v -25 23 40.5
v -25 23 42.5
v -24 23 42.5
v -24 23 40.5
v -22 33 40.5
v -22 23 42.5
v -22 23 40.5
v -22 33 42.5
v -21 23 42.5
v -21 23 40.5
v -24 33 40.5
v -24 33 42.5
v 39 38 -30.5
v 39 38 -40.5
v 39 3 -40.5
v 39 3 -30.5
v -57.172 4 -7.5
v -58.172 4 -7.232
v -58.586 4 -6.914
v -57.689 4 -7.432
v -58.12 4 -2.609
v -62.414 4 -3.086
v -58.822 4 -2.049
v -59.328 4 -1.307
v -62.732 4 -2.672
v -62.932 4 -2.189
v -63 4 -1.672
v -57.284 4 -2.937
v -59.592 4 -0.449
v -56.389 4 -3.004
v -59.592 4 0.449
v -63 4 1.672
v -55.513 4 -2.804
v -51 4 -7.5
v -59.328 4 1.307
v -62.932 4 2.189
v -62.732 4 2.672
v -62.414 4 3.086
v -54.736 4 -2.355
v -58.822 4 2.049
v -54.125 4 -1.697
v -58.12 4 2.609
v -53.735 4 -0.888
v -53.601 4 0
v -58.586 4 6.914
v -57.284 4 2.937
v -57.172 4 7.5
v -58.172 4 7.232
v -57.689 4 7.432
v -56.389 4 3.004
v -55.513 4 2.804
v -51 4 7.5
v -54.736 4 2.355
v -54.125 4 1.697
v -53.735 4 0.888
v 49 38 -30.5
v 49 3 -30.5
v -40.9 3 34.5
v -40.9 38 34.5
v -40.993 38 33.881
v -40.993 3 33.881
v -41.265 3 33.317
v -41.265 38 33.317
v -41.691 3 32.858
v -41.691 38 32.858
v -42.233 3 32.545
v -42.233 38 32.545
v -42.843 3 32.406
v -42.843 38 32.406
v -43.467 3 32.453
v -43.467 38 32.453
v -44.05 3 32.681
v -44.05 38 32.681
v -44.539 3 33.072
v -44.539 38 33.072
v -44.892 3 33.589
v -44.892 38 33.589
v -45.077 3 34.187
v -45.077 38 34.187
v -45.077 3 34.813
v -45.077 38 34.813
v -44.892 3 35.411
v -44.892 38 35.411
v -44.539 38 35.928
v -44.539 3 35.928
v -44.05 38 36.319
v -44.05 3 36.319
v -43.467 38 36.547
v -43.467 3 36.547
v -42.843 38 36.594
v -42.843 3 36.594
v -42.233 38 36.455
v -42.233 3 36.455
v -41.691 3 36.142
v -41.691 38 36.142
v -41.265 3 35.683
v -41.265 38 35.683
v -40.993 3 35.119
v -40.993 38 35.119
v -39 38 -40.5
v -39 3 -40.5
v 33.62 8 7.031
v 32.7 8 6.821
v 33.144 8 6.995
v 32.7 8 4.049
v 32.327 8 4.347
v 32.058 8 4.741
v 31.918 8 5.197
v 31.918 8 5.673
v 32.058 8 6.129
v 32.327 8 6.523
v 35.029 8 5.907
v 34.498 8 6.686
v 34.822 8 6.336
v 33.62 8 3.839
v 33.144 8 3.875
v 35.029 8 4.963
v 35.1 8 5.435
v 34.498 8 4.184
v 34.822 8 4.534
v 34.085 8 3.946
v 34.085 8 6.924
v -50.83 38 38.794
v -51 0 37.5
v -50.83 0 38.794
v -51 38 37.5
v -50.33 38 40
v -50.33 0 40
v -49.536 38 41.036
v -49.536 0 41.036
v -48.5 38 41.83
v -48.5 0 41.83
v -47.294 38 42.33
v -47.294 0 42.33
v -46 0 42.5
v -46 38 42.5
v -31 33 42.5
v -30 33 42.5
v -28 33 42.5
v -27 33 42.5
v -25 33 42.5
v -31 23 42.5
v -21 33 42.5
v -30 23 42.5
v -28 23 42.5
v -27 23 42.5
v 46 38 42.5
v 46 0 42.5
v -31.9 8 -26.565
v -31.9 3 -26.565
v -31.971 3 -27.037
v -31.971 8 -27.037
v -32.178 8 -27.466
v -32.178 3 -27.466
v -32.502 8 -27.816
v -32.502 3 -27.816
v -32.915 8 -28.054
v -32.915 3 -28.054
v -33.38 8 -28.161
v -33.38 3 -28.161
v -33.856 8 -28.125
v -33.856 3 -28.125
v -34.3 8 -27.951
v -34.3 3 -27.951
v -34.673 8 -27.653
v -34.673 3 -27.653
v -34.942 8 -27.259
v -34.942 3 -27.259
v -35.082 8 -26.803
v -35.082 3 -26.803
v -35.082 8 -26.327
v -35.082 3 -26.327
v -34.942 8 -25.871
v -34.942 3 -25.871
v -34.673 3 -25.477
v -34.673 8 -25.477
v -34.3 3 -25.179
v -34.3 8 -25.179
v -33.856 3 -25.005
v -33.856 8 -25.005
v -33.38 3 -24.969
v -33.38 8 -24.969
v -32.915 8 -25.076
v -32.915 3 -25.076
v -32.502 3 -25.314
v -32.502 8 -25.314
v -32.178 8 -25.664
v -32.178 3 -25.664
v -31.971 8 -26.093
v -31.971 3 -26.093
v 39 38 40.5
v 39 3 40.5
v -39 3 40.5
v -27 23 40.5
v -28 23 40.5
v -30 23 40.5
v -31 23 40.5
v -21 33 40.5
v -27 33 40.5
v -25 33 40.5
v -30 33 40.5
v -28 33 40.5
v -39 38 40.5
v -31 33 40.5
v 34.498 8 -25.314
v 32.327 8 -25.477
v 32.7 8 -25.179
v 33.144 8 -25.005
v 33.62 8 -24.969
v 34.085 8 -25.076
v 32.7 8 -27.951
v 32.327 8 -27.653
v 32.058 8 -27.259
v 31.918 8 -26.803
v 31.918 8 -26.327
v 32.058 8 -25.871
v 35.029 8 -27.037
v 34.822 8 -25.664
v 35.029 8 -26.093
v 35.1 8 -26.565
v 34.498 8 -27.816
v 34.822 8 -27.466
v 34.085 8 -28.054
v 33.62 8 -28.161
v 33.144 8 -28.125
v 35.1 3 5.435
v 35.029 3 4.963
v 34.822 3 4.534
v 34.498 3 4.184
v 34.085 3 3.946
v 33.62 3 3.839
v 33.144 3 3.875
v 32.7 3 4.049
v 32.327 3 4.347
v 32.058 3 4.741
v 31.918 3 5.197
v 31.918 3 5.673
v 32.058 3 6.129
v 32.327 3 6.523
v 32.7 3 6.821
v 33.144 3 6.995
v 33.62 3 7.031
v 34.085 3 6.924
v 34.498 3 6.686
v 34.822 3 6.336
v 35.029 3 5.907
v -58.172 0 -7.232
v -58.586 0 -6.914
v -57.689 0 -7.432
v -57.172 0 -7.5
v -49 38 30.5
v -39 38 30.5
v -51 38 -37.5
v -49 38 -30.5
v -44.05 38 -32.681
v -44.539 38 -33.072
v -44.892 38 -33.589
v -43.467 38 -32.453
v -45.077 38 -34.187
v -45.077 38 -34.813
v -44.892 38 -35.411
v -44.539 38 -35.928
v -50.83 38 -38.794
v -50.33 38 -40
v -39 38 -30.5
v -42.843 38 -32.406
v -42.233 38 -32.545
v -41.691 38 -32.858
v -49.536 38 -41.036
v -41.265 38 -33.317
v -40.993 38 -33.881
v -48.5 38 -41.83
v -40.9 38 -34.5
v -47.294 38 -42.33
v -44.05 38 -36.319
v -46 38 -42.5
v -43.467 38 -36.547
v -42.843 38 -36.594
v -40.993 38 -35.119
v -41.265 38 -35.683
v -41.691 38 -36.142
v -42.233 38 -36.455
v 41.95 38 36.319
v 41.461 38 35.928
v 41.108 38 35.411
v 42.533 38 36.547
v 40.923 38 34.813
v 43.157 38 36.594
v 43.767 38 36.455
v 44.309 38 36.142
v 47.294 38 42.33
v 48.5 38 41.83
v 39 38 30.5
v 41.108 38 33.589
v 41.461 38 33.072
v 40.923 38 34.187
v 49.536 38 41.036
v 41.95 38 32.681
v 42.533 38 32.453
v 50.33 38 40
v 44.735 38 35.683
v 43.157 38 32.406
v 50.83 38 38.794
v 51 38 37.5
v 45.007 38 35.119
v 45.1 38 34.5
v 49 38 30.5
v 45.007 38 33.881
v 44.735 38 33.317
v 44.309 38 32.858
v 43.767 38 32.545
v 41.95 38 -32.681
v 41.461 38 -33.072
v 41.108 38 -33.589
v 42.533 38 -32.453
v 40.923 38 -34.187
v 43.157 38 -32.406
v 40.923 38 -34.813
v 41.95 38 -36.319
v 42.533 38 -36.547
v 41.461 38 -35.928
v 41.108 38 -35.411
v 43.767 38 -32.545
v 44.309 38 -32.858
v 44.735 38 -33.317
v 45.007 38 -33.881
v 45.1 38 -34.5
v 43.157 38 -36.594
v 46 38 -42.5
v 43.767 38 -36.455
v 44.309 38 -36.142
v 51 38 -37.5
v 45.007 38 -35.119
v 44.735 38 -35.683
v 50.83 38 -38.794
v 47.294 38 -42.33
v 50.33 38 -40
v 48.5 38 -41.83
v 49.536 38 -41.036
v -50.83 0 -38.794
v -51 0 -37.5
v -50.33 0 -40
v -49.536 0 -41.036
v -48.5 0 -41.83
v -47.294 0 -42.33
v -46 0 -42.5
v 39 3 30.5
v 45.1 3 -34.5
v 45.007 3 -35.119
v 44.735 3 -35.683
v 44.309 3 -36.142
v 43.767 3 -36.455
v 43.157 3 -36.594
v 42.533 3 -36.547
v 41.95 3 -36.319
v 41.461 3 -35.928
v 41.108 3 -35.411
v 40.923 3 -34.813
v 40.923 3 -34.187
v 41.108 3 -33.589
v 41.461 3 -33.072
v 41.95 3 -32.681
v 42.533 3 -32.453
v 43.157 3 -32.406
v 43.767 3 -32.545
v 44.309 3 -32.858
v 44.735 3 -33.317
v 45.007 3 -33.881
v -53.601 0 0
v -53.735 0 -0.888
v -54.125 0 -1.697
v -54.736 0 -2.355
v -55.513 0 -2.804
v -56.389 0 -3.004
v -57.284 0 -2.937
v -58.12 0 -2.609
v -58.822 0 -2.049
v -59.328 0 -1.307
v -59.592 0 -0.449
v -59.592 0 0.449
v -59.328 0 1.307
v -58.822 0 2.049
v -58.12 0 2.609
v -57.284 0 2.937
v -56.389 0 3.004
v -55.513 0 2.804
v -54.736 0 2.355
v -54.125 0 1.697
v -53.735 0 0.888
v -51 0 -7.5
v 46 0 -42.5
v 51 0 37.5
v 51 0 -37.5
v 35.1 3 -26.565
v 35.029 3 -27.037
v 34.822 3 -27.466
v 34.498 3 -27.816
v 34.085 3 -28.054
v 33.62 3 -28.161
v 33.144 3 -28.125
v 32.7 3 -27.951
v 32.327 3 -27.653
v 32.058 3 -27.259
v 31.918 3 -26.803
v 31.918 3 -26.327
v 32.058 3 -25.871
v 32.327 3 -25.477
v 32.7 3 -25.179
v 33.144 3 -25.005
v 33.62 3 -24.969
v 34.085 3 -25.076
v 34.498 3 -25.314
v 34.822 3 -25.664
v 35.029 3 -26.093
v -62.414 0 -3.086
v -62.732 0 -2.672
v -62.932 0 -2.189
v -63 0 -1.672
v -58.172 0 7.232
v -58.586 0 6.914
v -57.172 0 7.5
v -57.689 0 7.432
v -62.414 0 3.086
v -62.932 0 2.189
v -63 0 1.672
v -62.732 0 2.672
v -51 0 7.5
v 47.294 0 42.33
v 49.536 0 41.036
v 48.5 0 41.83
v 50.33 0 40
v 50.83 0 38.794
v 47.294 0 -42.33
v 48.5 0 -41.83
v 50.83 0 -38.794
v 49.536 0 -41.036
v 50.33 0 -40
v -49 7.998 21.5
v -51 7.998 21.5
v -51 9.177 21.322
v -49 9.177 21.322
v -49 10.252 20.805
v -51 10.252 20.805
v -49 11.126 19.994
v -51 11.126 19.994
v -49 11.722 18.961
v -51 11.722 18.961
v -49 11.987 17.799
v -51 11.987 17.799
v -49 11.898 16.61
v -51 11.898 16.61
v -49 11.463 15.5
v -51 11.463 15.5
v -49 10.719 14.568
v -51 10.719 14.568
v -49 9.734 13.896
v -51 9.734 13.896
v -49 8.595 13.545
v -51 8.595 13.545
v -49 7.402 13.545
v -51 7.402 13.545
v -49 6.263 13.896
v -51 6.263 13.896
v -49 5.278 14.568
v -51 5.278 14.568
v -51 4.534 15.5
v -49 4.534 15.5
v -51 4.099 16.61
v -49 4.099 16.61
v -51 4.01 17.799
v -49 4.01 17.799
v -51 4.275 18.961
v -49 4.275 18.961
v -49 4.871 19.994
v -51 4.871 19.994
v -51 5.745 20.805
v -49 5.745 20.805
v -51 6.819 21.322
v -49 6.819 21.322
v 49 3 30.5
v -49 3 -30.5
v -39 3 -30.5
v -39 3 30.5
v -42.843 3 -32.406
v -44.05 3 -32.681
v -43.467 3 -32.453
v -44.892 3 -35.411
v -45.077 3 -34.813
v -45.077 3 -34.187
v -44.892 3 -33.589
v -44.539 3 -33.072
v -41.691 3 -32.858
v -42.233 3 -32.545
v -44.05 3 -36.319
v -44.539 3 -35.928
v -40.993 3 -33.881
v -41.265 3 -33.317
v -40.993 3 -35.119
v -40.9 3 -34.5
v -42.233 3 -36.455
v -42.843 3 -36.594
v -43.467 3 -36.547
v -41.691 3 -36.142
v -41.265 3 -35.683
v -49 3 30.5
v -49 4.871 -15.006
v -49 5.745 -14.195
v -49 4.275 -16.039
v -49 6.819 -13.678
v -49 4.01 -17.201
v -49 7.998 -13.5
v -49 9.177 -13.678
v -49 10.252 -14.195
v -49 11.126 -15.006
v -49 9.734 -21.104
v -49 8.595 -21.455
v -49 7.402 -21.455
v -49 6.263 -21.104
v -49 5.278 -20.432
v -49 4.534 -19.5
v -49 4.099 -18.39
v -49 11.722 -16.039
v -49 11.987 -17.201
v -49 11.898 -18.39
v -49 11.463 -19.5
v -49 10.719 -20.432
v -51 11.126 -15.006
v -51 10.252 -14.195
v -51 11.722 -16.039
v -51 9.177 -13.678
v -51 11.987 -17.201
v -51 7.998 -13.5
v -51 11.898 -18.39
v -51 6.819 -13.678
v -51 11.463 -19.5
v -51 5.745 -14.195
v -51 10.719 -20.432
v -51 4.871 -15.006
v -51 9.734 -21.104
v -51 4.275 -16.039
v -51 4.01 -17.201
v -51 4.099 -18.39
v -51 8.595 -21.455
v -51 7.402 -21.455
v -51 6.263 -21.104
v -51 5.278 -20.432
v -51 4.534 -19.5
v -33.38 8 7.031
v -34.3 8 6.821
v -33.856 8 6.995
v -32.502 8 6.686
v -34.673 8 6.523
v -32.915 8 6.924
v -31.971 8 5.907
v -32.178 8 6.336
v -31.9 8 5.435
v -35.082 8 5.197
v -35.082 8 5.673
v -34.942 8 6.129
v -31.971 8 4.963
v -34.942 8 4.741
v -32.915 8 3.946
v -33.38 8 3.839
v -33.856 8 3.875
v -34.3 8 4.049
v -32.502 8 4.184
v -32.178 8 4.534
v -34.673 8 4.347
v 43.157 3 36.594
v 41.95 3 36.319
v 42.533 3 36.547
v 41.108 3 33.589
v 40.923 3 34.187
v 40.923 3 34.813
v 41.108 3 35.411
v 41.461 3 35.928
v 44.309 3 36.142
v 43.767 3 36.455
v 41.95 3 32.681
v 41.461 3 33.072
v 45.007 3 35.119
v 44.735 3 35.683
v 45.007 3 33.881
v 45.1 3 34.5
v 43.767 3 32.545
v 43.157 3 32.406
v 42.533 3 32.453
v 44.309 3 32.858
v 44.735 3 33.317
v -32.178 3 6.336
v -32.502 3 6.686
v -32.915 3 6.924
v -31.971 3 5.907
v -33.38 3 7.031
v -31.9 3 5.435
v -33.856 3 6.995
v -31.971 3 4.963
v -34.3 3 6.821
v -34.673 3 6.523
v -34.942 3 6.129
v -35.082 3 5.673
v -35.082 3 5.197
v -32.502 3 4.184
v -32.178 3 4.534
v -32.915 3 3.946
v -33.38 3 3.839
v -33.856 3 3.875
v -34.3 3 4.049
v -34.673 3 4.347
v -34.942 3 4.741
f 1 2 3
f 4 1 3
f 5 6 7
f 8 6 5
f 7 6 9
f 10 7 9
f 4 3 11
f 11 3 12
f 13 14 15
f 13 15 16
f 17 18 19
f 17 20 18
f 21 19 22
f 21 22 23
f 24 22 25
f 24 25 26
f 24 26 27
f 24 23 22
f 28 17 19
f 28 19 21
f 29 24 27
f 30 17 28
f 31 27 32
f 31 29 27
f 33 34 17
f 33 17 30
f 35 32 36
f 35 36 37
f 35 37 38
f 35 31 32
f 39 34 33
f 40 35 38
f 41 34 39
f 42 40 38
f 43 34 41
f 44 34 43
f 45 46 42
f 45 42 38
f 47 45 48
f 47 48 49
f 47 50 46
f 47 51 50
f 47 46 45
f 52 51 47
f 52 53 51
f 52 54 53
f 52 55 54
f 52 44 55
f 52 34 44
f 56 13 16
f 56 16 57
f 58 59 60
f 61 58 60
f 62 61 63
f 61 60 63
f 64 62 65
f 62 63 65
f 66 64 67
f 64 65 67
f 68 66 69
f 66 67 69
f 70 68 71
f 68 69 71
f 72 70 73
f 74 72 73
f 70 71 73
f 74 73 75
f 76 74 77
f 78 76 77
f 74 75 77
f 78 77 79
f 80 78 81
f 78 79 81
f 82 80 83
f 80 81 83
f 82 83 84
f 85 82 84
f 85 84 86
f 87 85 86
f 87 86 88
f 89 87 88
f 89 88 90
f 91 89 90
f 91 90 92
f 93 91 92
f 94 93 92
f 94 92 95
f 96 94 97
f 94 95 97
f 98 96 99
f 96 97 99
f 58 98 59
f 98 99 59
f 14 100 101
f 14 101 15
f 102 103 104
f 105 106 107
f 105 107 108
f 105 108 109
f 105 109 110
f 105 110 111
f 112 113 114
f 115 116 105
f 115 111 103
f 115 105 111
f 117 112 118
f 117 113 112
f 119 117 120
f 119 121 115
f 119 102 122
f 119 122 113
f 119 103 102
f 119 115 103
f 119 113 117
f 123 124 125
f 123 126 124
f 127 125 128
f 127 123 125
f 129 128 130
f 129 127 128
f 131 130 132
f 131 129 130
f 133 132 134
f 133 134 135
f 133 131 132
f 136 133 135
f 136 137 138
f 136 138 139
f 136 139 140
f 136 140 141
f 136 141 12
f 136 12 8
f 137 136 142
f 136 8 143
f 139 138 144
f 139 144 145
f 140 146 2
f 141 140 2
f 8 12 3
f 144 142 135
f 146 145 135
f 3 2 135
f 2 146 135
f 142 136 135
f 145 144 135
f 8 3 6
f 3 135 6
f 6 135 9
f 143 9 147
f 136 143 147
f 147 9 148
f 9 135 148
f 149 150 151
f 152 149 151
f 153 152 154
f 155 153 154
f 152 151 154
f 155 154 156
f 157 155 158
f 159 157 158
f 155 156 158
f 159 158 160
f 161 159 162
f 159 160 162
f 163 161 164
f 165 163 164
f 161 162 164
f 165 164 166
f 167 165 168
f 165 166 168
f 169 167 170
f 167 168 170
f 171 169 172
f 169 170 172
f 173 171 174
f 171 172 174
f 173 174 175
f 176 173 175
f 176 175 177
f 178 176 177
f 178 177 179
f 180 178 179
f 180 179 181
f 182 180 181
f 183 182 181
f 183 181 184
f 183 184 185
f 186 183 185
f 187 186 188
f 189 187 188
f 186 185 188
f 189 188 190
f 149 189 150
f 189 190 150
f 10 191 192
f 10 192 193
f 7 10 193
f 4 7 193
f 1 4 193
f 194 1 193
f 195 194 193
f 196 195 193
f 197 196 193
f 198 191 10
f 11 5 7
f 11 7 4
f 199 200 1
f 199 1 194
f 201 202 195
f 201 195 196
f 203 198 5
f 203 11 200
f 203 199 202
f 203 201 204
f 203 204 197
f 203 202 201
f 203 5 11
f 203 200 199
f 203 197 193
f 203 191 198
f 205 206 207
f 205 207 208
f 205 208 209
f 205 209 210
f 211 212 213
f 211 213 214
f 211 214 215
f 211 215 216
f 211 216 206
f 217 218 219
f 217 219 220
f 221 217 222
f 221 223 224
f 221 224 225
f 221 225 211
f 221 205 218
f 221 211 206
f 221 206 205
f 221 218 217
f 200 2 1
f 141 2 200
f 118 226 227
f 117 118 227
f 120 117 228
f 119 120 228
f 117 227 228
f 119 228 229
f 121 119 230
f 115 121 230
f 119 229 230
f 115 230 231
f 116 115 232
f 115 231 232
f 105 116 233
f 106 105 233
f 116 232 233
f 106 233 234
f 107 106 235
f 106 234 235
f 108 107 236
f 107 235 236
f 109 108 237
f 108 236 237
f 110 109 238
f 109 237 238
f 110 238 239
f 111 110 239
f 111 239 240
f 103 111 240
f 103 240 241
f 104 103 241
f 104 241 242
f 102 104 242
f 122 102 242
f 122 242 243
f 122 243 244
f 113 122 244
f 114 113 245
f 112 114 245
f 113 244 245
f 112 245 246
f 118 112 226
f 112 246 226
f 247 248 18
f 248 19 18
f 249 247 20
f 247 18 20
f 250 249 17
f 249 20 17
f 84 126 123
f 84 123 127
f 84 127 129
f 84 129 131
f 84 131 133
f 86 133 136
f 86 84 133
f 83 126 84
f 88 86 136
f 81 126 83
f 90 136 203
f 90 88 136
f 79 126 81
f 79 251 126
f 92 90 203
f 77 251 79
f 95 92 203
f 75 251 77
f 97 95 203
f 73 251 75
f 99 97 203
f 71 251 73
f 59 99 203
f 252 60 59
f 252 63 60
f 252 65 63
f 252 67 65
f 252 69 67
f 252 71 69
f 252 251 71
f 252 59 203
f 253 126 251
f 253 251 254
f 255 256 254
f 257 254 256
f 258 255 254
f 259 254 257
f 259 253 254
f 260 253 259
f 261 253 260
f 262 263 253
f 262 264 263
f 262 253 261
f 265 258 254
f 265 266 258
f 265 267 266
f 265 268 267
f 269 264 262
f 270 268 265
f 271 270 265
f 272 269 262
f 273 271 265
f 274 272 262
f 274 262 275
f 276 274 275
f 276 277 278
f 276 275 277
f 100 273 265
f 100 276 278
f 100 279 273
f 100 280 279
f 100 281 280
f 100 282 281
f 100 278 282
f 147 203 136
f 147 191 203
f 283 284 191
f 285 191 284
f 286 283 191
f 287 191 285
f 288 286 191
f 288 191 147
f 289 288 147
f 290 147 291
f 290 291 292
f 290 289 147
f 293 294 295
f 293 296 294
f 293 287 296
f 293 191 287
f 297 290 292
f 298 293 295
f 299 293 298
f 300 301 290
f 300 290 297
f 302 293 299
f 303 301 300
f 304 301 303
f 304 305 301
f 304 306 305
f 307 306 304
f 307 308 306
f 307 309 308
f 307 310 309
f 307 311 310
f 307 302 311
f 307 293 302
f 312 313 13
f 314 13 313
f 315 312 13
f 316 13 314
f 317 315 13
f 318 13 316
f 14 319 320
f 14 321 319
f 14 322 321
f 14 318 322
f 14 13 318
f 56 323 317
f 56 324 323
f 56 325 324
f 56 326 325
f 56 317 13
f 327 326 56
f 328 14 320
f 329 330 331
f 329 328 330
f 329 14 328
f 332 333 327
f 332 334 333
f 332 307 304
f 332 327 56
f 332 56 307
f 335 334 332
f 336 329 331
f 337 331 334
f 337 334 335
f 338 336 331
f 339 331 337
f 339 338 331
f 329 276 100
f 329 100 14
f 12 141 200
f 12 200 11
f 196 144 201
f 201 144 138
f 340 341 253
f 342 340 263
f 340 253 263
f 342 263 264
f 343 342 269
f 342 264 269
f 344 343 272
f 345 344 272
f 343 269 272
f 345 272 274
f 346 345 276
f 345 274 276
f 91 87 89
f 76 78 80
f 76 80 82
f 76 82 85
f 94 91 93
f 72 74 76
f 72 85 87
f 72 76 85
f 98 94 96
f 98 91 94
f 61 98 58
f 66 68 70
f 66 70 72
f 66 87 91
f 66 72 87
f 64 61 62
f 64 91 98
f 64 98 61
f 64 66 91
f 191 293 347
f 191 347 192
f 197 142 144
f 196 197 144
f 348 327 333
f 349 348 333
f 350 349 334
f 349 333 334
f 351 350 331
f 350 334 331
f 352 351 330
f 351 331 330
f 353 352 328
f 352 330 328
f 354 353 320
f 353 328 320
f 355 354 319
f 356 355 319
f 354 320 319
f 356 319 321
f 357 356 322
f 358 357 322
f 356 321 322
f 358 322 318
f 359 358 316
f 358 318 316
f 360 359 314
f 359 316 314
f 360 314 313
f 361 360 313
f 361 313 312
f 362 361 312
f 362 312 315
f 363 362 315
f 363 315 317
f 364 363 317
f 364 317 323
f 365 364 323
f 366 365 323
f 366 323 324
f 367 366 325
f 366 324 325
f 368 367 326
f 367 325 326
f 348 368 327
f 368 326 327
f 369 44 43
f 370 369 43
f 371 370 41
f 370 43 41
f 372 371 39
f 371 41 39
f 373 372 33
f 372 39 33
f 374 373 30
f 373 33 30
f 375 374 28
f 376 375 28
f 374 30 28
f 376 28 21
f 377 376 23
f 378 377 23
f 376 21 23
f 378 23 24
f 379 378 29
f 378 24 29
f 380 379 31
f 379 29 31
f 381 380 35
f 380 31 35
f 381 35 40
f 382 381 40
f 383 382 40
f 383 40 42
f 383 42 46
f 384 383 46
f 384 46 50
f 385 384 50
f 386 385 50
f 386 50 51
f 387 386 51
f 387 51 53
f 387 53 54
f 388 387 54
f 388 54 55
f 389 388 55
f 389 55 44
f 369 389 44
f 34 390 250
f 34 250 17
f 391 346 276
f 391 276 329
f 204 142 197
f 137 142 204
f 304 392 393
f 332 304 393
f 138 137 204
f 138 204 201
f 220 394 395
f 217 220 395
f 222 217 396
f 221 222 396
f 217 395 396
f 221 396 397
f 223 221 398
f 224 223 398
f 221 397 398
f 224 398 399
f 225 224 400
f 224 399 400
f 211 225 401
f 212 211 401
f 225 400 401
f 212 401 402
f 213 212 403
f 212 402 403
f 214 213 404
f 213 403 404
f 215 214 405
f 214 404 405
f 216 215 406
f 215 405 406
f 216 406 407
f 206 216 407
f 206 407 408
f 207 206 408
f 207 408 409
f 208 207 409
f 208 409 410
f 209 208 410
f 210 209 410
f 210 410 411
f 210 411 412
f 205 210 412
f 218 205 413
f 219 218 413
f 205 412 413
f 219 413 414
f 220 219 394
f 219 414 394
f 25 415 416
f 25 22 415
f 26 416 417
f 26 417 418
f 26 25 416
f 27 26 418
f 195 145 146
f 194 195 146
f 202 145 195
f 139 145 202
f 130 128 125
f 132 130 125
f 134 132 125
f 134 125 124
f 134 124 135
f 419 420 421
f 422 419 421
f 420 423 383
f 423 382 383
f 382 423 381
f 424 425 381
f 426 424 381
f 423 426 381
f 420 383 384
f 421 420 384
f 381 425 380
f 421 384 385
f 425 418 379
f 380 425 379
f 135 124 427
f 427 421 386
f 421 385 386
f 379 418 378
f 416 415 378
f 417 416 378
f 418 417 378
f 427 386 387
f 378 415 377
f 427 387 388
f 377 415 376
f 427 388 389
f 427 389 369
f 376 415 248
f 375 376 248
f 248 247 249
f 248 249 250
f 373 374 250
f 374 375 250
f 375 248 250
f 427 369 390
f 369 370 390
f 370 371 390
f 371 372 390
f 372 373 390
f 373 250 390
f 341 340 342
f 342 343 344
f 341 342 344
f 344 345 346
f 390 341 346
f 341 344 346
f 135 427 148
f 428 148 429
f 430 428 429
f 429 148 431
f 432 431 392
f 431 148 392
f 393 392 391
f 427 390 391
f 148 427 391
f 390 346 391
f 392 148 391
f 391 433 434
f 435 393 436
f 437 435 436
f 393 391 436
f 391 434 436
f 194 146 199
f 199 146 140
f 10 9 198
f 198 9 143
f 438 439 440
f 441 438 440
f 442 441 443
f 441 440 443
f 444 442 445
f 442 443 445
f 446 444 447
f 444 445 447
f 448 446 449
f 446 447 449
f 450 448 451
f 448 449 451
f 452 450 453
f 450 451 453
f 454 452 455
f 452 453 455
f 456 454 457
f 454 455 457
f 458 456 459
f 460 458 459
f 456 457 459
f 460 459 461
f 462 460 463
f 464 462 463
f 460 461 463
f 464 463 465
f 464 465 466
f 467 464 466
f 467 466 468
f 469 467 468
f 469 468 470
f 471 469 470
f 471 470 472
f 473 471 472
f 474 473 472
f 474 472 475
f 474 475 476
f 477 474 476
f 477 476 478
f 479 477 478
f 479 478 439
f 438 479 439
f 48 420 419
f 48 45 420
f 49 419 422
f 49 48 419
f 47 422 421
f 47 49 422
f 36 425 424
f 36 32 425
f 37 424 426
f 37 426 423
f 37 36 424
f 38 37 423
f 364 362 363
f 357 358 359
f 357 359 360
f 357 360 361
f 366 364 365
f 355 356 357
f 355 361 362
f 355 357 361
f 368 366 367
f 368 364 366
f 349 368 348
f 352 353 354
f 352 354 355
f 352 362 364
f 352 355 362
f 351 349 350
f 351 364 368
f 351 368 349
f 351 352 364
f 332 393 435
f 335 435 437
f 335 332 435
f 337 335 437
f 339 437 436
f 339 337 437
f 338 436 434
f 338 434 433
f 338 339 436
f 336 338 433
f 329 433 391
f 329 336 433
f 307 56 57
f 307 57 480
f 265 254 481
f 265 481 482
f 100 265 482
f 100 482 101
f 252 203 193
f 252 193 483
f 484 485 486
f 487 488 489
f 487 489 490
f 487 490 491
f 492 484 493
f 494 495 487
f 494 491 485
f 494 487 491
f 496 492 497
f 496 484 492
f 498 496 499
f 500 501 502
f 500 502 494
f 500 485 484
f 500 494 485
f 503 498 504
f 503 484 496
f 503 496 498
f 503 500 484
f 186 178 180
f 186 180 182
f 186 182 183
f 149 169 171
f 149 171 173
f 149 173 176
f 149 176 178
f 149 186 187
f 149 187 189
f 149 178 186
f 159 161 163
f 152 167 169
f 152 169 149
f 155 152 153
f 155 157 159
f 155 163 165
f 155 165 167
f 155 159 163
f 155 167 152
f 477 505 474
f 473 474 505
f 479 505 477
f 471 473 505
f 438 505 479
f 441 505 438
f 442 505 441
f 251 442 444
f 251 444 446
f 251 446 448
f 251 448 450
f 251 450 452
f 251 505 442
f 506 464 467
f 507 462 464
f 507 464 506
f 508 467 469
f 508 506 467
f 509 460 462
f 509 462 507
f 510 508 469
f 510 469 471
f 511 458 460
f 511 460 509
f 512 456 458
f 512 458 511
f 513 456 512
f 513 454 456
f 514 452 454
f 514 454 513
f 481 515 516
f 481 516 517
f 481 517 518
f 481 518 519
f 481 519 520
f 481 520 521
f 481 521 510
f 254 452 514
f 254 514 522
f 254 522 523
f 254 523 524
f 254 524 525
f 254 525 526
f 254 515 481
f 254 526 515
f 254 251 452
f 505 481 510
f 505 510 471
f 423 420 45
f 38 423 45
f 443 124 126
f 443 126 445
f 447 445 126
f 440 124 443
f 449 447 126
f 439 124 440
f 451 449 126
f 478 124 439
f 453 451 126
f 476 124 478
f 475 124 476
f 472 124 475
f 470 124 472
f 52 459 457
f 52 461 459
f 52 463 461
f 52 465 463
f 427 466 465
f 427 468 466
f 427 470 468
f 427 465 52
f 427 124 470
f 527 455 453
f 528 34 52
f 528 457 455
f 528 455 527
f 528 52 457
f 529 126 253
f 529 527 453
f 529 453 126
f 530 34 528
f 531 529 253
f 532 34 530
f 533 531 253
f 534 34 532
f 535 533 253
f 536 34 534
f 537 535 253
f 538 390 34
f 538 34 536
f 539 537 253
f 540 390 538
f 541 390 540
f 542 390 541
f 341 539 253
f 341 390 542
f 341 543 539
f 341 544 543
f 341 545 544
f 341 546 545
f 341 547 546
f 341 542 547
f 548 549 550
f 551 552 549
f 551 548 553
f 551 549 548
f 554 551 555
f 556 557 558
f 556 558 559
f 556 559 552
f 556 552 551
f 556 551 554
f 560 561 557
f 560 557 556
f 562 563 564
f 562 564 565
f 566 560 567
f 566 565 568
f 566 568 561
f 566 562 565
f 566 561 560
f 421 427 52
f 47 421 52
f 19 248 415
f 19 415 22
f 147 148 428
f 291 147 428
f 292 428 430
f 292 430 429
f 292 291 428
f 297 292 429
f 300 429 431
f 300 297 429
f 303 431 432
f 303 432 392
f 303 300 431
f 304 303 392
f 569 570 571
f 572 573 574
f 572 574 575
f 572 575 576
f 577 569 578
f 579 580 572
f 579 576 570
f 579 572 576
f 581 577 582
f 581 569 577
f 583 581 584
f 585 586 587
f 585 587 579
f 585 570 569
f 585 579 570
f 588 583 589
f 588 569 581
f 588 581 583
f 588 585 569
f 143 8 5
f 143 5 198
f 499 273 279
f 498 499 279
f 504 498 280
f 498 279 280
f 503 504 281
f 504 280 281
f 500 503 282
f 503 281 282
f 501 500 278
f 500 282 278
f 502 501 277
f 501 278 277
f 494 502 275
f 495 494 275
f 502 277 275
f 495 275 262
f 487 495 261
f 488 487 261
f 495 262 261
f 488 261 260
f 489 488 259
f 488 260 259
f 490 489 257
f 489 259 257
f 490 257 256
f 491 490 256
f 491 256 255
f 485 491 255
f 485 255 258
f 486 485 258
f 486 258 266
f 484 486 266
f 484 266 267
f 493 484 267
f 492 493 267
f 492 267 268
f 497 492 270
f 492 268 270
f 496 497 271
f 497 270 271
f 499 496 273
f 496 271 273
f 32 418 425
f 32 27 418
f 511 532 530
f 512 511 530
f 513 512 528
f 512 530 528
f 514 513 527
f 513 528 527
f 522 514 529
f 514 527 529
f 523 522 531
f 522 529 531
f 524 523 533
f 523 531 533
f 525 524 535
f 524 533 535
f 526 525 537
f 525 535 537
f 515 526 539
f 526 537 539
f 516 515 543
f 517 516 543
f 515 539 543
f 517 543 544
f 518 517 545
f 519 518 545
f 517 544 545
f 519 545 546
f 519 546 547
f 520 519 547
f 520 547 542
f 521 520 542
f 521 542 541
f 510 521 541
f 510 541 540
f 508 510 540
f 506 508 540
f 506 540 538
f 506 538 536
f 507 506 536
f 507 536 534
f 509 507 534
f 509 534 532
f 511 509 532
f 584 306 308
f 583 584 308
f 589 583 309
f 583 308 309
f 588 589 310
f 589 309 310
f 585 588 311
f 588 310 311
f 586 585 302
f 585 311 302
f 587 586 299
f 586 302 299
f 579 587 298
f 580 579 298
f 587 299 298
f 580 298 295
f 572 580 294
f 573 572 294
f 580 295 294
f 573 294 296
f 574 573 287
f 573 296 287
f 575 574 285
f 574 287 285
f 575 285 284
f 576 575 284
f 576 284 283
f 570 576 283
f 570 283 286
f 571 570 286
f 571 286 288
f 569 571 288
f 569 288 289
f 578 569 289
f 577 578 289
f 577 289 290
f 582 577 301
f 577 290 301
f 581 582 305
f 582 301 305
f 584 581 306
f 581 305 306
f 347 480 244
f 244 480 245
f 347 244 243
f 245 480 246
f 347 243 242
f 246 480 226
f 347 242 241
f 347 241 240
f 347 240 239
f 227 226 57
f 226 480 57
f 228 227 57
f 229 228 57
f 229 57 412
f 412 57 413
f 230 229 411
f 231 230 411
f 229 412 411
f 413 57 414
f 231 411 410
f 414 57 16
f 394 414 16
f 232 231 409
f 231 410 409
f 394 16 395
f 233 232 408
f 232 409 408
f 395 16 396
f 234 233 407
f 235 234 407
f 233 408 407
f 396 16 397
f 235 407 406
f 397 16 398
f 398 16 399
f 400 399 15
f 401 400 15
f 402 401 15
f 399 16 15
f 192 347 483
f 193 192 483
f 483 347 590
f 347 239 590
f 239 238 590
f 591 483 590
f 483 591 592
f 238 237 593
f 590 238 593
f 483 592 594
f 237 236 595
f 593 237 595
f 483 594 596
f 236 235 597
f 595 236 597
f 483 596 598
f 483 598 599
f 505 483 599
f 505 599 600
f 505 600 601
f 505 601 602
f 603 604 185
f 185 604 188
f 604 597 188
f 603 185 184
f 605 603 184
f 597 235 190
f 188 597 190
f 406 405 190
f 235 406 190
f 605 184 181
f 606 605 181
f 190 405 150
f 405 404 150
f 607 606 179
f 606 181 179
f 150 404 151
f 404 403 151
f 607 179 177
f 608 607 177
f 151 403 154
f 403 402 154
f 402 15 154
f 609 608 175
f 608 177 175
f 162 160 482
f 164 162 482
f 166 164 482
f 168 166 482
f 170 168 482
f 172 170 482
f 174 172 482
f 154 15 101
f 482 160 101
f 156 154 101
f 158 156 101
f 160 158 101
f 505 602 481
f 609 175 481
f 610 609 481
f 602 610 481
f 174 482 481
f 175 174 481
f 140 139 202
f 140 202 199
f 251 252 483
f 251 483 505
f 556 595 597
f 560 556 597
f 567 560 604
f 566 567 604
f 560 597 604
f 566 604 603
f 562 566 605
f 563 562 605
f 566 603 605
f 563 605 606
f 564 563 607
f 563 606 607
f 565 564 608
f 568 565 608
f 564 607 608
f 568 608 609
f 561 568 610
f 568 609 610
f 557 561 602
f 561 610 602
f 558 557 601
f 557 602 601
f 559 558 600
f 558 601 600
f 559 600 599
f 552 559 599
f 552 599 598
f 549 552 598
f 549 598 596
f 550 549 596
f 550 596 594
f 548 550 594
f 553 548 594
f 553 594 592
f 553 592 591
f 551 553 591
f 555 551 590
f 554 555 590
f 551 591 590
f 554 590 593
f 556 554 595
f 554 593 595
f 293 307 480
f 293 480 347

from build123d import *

# Parameters (mm, degrees)
SKETCH1_W           = 102
SKETCH1_H           = 85
BOSS_EXTRUDE1_DEPTH = 38
SKETCH2_R           = 2.1
CUT_EXTRUDE1_DEPTH  = 35
SKETCH3_R           = 2.1
CUT_EXTRUDE2_DEPTH  = 35
SKETCH5_R           = 4
CUT_EXTRUDE4_DEPTH  = 10
FILLET1_R           = 5
FILLET2_R           = 5
FILLET3_R           = 5
FILLET4_R           = 5
SKETCH6_R           = 1.6
BOSS_EXTRUDE2_DEPTH = 5
SKETCH7_W           = 15
SKETCH7_H           = 4
BOSS_EXTRUDE3_DEPTH = 12
CHAMFER1_SIZE       = 5
CHAMFER2_SIZE       = 5
SKETCH8_R           = 3.012300636
CUT_EXTRUDE5_DEPTH  = 5
FILLET5_R           = 2
FILLET6_R           = 2
FILLET7_R           = 2
FILLET8_R           = 2
SKETCH9_W           = 1
SKETCH9_H           = 10
CUT_EXTRUDE6_DEPTH  = 2.1
SKETCH10_W          = 1
SKETCH10_H          = 10
CUT_EXTRUDE7_DEPTH  = 2.1


with BuildPart() as part:
    # Sketch1 → Boss-Extrude1 (new body)
    with BuildSketch(Plane(origin=(0, 0, 0), x_dir=(1, 0, 0), z_dir=(0, 1, 0))):
        Rectangle(SKETCH1_W, SKETCH1_H)
    extrude(amount=BOSS_EXTRUDE1_DEPTH)

    # Sketch2 → Cut-Extrude1 (cut)
    with BuildSketch(Plane(origin=(0, 38, 0), x_dir=(1, 0, 0), z_dir=(0, 1, 0))):
        with Locations((43, 34.5)):
            Circle(SKETCH2_R)
        with Locations((-43, -34.5)):
            Circle(SKETCH2_R)
        with Locations((43, -34.5)):
            Circle(SKETCH2_R)
        Polygon((-39, 40.5), (39, 40.5), (39, 30.5), (49, 30.5), (49, -30.5), (39, -30.5), (39, -40.5), (-39, -40.5), (-39, -30.5), (-49, -30.5), (-49, 30.5), (-39, 30.5), align=None)
    extrude(amount=-CUT_EXTRUDE1_DEPTH, mode=Mode.SUBTRACT)

    # Sketch3 → Cut-Extrude2 (cut)
    with BuildSketch(Plane(origin=(0, 38, 0), x_dir=(1, 0, 0), z_dir=(0, 1, 0))):
        with Locations((-43, 34.5)):
            Circle(SKETCH3_R)
    extrude(amount=-CUT_EXTRUDE2_DEPTH, mode=Mode.SUBTRACT)

    # Sketch5 → Cut-Extrude4 (cut)
    with BuildSketch(Plane.ZY.offset(51)):
        with Locations((-17.5, 7.998461061)):
            Circle(SKETCH5_R)
        with Locations((17.5, 7.998461061)):
            Circle(SKETCH5_R)
    extrude(amount=-CUT_EXTRUDE4_DEPTH, mode=Mode.SUBTRACT)

    # Fillet1
    fillet1_edges = [part.edges().sort_by_distance(p)[0] for p in [
        (-51, 19, 42.5),
    ]]
    fillet(fillet1_edges, radius=FILLET1_R)

    # Fillet2
    fillet2_edges = [part.edges().sort_by_distance(p)[0] for p in [
        (-51, 19, -42.5),
    ]]
    fillet(fillet2_edges, radius=FILLET2_R)

    # Fillet3
    fillet3_edges = [part.edges().sort_by_distance(p)[0] for p in [
        (51, 19, 42.5),
    ]]
    fillet(fillet3_edges, radius=FILLET3_R)

    # Fillet4
    fillet4_edges = [part.edges().sort_by_distance(p)[0] for p in [
        (51, 19, -42.5),
    ]]
    fillet(fillet4_edges, radius=FILLET4_R)

    # Sketch6 → Boss-Extrude2 (add)
    with BuildSketch(Plane(origin=(0, 3, 0), x_dir=(1, 0, 0), z_dir=(0, 1, 0))):
        with Locations((-33.5, 26.565019739)):
            Circle(SKETCH6_R)
        with Locations((-33.5, -5.434980261)):
            Circle(SKETCH6_R)
        with Locations((33.5, 26.565019739)):
            Circle(SKETCH6_R)
        with Locations((33.5, -5.434980261)):
            Circle(SKETCH6_R)
    extrude(amount=BOSS_EXTRUDE2_DEPTH)

    # Sketch7 → Boss-Extrude3 (add)
    with BuildSketch(Plane.ZY.offset(51)):
        with Locations((0, 2)):
            Rectangle(SKETCH7_W, SKETCH7_H)
    extrude(amount=BOSS_EXTRUDE3_DEPTH)

    # Chamfer1
    chamfer1_edges = [part.edges().sort_by_distance(p)[0] for p in [
        (-63, 2, -7.5),
    ]]
    chamfer(chamfer1_edges, length=CHAMFER1_SIZE)

    # Chamfer2
    chamfer2_edges = [part.edges().sort_by_distance(p)[0] for p in [
        (-63, 2, 7.5),
    ]]
    chamfer(chamfer2_edges, length=CHAMFER2_SIZE)

    # Sketch8 → Cut-Extrude5 (cut)
    with BuildSketch(Plane(origin=(0, 4, 0), x_dir=(1, 0, 0), z_dir=(0, 1, 0))):
        with Locations((-56.61368814, 0)):
            Circle(SKETCH8_R)
    extrude(amount=-CUT_EXTRUDE5_DEPTH, mode=Mode.SUBTRACT)

    # Fillet5
    fillet5_edges = [part.edges().sort_by_distance(p)[0] for p in [
        (-58, 2, -7.5),
    ]]
    fillet(fillet5_edges, radius=FILLET5_R)

    # Fillet6
    fillet6_edges = [part.edges().sort_by_distance(p)[0] for p in [
        (-63, 2, -2.5),
    ]]
    fillet(fillet6_edges, radius=FILLET6_R)

    # Fillet7
    fillet7_edges = [part.edges().sort_by_distance(p)[0] for p in [
        (-63, 2, 2.5),
    ]]
    fillet(fillet7_edges, radius=FILLET7_R)

    # Fillet8
    fillet8_edges = [part.edges().sort_by_distance(p)[0] for p in [
        (-58, 2, 7.5),
    ]]
    fillet(fillet8_edges, radius=FILLET8_R)

    # Sketch9 → Cut-Extrude6 (cut)
    with BuildSketch(Plane.XY.offset(42.5)):
        with Locations((-30.5, 28)):
            Rectangle(SKETCH9_W, SKETCH9_H)
    extrude(amount=-CUT_EXTRUDE6_DEPTH, mode=Mode.SUBTRACT)

    # Sketch10 → Cut-Extrude7 (cut)
    with BuildSketch(Plane.XY.offset(42.5)):
        with Locations((-27.5, 28)):
            Rectangle(SKETCH10_W, SKETCH10_H)
        with Locations((-24.5, 28)):
            Rectangle(SKETCH10_W, SKETCH10_H)
        with Locations((-21.5, 28)):
            Rectangle(SKETCH10_W, SKETCH10_H)
    extrude(amount=-CUT_EXTRUDE7_DEPTH, mode=Mode.SUBTRACT)


solid = part.part
